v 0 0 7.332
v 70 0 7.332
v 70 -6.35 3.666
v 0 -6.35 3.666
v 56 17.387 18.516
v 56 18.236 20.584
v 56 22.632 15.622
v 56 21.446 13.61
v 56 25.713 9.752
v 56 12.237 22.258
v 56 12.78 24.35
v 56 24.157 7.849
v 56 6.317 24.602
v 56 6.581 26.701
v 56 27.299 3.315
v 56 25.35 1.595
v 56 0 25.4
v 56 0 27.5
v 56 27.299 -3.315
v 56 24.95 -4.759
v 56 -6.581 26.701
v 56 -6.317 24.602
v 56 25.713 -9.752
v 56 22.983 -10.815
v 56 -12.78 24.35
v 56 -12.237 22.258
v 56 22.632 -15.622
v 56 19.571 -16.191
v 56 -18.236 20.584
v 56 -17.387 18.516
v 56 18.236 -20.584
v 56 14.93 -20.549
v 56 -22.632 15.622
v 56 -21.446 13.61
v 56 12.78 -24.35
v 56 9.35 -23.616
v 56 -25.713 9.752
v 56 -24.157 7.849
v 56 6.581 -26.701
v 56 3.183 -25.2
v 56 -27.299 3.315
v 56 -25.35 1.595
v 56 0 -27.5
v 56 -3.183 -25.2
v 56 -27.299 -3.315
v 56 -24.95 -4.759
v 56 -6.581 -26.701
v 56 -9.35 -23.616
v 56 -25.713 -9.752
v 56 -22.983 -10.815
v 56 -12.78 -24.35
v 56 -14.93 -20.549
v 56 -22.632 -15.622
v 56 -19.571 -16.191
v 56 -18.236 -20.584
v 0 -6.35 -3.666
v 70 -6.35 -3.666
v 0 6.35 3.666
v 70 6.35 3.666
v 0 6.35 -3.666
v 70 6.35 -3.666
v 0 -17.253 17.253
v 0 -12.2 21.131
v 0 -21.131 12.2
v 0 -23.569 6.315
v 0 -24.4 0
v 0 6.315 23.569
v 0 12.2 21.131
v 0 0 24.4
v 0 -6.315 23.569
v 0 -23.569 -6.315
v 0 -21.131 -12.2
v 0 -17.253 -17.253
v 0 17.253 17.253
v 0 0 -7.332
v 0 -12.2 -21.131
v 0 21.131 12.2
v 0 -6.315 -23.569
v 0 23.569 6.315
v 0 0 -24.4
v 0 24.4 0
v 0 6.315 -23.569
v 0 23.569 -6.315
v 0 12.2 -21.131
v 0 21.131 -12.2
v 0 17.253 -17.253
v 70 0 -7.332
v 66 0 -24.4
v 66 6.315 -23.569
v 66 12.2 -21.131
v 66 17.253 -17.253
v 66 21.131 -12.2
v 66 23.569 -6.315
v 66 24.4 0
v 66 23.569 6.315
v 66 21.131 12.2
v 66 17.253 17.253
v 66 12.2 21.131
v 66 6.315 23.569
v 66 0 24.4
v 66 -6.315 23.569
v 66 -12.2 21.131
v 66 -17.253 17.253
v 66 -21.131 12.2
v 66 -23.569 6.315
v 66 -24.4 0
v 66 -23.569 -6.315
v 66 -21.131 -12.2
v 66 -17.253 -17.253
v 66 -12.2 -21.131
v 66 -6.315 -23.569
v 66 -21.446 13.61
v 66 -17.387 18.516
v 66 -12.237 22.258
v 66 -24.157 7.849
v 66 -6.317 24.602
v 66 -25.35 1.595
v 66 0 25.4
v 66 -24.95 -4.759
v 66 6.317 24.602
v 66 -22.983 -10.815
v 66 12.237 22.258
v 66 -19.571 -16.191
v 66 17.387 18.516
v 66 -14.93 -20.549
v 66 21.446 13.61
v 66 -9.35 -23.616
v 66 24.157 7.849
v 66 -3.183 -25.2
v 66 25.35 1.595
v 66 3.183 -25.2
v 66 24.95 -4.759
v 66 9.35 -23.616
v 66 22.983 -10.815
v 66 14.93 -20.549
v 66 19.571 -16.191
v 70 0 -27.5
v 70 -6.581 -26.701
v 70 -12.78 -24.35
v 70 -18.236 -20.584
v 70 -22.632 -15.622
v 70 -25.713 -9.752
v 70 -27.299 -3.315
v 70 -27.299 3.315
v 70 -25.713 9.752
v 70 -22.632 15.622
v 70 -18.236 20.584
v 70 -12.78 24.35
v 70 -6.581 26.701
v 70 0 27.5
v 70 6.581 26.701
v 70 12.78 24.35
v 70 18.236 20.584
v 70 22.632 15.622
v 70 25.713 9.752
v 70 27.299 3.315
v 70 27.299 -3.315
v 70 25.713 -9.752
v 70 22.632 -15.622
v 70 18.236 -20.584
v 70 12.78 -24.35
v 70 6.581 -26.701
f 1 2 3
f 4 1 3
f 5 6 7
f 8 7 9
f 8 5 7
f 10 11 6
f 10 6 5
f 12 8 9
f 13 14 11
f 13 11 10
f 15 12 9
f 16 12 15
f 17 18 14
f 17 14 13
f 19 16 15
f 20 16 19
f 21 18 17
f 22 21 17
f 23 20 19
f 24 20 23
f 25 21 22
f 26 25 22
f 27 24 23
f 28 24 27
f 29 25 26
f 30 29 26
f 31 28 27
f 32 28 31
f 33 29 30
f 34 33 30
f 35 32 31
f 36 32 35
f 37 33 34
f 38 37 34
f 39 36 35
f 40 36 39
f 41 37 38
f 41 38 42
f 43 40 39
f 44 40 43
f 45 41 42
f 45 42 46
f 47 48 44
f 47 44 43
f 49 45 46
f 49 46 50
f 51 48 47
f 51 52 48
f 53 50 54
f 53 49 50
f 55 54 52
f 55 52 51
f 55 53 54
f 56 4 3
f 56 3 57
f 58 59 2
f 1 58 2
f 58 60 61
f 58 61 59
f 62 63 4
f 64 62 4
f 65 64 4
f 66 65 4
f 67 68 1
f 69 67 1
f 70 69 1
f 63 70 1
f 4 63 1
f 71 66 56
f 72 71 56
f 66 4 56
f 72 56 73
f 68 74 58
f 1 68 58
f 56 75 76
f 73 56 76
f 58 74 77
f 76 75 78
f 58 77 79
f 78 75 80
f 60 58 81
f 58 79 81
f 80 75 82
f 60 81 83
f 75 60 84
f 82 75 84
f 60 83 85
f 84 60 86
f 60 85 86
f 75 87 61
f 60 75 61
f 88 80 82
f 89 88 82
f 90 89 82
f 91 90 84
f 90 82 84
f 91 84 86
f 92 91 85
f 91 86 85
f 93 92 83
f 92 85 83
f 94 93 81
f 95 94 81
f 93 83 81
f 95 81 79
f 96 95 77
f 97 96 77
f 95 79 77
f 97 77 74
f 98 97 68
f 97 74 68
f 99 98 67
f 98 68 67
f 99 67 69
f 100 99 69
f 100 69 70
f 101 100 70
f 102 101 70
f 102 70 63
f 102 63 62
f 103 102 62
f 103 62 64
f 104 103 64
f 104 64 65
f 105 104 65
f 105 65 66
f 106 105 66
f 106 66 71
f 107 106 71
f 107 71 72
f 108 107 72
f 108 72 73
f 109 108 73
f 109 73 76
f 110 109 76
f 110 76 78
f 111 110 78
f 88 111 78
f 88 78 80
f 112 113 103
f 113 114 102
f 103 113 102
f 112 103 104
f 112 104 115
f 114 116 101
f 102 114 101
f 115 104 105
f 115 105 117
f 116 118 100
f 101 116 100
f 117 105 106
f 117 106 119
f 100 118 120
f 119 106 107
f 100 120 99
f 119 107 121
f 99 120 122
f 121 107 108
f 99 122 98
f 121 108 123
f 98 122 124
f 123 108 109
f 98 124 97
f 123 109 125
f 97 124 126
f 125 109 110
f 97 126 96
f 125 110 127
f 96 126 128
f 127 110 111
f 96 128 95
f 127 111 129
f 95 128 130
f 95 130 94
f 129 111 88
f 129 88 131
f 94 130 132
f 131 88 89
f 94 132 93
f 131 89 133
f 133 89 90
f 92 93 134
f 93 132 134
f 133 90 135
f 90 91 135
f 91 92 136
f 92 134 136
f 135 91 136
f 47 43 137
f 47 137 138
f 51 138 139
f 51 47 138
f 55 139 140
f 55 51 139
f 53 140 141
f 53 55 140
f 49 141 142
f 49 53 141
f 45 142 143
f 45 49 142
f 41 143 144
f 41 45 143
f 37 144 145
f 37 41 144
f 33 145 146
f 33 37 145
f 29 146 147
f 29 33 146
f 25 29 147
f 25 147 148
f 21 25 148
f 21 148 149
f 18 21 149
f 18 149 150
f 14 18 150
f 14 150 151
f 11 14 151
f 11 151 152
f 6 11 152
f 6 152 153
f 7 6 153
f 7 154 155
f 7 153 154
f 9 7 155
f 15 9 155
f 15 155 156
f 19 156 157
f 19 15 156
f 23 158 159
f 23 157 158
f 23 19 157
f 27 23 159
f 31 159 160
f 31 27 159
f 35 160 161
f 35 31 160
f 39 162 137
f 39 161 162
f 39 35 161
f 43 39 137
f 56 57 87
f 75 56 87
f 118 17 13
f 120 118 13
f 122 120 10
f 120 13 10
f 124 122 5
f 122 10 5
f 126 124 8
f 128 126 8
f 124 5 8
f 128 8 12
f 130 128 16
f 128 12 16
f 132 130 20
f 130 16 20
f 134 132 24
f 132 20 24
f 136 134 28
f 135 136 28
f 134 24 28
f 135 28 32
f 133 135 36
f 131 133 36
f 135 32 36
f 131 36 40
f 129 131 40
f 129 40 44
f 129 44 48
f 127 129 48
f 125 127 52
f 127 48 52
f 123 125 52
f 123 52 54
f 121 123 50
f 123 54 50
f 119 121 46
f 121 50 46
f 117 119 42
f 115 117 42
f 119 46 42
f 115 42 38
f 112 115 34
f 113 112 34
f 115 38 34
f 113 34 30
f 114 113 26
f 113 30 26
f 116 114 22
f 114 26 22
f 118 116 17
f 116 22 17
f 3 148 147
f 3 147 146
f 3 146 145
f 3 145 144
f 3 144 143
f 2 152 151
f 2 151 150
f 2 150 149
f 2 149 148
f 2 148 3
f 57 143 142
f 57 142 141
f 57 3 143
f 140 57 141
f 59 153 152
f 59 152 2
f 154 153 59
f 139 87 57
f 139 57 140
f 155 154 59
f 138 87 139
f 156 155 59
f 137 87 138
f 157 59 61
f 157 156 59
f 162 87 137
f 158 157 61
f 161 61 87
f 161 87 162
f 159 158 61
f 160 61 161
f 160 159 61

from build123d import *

# Parameters (mm, degrees)
CROQUIS1_R              = 24.4
SALIENTE_EXTRUIR1_DEPTH = 70
SALIENTE_EXTRUIR2_START = -4
CROQUIS2_R              = 27.5
CROQUIS2_R_2            = 24.4
SALIENTE_EXTRUIR2_DEPTH = 4
SALIENTE_EXTRUIR3_START = 10
CROQUIS3_R              = 27.5
CROQUIS3_R_2            = 25.4
SALIENTE_EXTRUIR3_DEPTH = 10


with BuildPart() as part:
    # Croquis1 → Saliente-Extruir1 (new body)
    with BuildSketch(Plane(origin=(0, 0, 0), x_dir=(0, 0, -1), z_dir=(1, 0, 0))):
        Circle(CROQUIS1_R)
        Polygon((7.332348419, 0), (3.666174209, 6.35), (-3.666174209, 6.35), (-7.332348419, 0), (-3.666174209, -6.35), (3.666174209, -6.35), align=None, mode=Mode.SUBTRACT)
    extrude(amount=SALIENTE_EXTRUIR1_DEPTH)

    # Croquis2 → Saliente-Extruir2 (add)
    with BuildSketch(Plane(origin=(70, 0, 0), x_dir=(0, 0, -1), z_dir=(1, 0, 0)).offset(SALIENTE_EXTRUIR2_START)):
        Circle(CROQUIS2_R)
        Circle(CROQUIS2_R_2, mode=Mode.SUBTRACT)
    extrude(amount=SALIENTE_EXTRUIR2_DEPTH)

    # Croquis3 → Saliente-Extruir3 (add)
    with BuildSketch(Plane.ZY.offset(-66).offset(SALIENTE_EXTRUIR3_START)):
        with Locations(Location((0, 0, 0), (0, 0, 180))):
            Circle(CROQUIS3_R)
        Circle(CROQUIS3_R_2, mode=Mode.SUBTRACT)
    extrude(amount=-SALIENTE_EXTRUIR3_DEPTH)


solid = part.part
